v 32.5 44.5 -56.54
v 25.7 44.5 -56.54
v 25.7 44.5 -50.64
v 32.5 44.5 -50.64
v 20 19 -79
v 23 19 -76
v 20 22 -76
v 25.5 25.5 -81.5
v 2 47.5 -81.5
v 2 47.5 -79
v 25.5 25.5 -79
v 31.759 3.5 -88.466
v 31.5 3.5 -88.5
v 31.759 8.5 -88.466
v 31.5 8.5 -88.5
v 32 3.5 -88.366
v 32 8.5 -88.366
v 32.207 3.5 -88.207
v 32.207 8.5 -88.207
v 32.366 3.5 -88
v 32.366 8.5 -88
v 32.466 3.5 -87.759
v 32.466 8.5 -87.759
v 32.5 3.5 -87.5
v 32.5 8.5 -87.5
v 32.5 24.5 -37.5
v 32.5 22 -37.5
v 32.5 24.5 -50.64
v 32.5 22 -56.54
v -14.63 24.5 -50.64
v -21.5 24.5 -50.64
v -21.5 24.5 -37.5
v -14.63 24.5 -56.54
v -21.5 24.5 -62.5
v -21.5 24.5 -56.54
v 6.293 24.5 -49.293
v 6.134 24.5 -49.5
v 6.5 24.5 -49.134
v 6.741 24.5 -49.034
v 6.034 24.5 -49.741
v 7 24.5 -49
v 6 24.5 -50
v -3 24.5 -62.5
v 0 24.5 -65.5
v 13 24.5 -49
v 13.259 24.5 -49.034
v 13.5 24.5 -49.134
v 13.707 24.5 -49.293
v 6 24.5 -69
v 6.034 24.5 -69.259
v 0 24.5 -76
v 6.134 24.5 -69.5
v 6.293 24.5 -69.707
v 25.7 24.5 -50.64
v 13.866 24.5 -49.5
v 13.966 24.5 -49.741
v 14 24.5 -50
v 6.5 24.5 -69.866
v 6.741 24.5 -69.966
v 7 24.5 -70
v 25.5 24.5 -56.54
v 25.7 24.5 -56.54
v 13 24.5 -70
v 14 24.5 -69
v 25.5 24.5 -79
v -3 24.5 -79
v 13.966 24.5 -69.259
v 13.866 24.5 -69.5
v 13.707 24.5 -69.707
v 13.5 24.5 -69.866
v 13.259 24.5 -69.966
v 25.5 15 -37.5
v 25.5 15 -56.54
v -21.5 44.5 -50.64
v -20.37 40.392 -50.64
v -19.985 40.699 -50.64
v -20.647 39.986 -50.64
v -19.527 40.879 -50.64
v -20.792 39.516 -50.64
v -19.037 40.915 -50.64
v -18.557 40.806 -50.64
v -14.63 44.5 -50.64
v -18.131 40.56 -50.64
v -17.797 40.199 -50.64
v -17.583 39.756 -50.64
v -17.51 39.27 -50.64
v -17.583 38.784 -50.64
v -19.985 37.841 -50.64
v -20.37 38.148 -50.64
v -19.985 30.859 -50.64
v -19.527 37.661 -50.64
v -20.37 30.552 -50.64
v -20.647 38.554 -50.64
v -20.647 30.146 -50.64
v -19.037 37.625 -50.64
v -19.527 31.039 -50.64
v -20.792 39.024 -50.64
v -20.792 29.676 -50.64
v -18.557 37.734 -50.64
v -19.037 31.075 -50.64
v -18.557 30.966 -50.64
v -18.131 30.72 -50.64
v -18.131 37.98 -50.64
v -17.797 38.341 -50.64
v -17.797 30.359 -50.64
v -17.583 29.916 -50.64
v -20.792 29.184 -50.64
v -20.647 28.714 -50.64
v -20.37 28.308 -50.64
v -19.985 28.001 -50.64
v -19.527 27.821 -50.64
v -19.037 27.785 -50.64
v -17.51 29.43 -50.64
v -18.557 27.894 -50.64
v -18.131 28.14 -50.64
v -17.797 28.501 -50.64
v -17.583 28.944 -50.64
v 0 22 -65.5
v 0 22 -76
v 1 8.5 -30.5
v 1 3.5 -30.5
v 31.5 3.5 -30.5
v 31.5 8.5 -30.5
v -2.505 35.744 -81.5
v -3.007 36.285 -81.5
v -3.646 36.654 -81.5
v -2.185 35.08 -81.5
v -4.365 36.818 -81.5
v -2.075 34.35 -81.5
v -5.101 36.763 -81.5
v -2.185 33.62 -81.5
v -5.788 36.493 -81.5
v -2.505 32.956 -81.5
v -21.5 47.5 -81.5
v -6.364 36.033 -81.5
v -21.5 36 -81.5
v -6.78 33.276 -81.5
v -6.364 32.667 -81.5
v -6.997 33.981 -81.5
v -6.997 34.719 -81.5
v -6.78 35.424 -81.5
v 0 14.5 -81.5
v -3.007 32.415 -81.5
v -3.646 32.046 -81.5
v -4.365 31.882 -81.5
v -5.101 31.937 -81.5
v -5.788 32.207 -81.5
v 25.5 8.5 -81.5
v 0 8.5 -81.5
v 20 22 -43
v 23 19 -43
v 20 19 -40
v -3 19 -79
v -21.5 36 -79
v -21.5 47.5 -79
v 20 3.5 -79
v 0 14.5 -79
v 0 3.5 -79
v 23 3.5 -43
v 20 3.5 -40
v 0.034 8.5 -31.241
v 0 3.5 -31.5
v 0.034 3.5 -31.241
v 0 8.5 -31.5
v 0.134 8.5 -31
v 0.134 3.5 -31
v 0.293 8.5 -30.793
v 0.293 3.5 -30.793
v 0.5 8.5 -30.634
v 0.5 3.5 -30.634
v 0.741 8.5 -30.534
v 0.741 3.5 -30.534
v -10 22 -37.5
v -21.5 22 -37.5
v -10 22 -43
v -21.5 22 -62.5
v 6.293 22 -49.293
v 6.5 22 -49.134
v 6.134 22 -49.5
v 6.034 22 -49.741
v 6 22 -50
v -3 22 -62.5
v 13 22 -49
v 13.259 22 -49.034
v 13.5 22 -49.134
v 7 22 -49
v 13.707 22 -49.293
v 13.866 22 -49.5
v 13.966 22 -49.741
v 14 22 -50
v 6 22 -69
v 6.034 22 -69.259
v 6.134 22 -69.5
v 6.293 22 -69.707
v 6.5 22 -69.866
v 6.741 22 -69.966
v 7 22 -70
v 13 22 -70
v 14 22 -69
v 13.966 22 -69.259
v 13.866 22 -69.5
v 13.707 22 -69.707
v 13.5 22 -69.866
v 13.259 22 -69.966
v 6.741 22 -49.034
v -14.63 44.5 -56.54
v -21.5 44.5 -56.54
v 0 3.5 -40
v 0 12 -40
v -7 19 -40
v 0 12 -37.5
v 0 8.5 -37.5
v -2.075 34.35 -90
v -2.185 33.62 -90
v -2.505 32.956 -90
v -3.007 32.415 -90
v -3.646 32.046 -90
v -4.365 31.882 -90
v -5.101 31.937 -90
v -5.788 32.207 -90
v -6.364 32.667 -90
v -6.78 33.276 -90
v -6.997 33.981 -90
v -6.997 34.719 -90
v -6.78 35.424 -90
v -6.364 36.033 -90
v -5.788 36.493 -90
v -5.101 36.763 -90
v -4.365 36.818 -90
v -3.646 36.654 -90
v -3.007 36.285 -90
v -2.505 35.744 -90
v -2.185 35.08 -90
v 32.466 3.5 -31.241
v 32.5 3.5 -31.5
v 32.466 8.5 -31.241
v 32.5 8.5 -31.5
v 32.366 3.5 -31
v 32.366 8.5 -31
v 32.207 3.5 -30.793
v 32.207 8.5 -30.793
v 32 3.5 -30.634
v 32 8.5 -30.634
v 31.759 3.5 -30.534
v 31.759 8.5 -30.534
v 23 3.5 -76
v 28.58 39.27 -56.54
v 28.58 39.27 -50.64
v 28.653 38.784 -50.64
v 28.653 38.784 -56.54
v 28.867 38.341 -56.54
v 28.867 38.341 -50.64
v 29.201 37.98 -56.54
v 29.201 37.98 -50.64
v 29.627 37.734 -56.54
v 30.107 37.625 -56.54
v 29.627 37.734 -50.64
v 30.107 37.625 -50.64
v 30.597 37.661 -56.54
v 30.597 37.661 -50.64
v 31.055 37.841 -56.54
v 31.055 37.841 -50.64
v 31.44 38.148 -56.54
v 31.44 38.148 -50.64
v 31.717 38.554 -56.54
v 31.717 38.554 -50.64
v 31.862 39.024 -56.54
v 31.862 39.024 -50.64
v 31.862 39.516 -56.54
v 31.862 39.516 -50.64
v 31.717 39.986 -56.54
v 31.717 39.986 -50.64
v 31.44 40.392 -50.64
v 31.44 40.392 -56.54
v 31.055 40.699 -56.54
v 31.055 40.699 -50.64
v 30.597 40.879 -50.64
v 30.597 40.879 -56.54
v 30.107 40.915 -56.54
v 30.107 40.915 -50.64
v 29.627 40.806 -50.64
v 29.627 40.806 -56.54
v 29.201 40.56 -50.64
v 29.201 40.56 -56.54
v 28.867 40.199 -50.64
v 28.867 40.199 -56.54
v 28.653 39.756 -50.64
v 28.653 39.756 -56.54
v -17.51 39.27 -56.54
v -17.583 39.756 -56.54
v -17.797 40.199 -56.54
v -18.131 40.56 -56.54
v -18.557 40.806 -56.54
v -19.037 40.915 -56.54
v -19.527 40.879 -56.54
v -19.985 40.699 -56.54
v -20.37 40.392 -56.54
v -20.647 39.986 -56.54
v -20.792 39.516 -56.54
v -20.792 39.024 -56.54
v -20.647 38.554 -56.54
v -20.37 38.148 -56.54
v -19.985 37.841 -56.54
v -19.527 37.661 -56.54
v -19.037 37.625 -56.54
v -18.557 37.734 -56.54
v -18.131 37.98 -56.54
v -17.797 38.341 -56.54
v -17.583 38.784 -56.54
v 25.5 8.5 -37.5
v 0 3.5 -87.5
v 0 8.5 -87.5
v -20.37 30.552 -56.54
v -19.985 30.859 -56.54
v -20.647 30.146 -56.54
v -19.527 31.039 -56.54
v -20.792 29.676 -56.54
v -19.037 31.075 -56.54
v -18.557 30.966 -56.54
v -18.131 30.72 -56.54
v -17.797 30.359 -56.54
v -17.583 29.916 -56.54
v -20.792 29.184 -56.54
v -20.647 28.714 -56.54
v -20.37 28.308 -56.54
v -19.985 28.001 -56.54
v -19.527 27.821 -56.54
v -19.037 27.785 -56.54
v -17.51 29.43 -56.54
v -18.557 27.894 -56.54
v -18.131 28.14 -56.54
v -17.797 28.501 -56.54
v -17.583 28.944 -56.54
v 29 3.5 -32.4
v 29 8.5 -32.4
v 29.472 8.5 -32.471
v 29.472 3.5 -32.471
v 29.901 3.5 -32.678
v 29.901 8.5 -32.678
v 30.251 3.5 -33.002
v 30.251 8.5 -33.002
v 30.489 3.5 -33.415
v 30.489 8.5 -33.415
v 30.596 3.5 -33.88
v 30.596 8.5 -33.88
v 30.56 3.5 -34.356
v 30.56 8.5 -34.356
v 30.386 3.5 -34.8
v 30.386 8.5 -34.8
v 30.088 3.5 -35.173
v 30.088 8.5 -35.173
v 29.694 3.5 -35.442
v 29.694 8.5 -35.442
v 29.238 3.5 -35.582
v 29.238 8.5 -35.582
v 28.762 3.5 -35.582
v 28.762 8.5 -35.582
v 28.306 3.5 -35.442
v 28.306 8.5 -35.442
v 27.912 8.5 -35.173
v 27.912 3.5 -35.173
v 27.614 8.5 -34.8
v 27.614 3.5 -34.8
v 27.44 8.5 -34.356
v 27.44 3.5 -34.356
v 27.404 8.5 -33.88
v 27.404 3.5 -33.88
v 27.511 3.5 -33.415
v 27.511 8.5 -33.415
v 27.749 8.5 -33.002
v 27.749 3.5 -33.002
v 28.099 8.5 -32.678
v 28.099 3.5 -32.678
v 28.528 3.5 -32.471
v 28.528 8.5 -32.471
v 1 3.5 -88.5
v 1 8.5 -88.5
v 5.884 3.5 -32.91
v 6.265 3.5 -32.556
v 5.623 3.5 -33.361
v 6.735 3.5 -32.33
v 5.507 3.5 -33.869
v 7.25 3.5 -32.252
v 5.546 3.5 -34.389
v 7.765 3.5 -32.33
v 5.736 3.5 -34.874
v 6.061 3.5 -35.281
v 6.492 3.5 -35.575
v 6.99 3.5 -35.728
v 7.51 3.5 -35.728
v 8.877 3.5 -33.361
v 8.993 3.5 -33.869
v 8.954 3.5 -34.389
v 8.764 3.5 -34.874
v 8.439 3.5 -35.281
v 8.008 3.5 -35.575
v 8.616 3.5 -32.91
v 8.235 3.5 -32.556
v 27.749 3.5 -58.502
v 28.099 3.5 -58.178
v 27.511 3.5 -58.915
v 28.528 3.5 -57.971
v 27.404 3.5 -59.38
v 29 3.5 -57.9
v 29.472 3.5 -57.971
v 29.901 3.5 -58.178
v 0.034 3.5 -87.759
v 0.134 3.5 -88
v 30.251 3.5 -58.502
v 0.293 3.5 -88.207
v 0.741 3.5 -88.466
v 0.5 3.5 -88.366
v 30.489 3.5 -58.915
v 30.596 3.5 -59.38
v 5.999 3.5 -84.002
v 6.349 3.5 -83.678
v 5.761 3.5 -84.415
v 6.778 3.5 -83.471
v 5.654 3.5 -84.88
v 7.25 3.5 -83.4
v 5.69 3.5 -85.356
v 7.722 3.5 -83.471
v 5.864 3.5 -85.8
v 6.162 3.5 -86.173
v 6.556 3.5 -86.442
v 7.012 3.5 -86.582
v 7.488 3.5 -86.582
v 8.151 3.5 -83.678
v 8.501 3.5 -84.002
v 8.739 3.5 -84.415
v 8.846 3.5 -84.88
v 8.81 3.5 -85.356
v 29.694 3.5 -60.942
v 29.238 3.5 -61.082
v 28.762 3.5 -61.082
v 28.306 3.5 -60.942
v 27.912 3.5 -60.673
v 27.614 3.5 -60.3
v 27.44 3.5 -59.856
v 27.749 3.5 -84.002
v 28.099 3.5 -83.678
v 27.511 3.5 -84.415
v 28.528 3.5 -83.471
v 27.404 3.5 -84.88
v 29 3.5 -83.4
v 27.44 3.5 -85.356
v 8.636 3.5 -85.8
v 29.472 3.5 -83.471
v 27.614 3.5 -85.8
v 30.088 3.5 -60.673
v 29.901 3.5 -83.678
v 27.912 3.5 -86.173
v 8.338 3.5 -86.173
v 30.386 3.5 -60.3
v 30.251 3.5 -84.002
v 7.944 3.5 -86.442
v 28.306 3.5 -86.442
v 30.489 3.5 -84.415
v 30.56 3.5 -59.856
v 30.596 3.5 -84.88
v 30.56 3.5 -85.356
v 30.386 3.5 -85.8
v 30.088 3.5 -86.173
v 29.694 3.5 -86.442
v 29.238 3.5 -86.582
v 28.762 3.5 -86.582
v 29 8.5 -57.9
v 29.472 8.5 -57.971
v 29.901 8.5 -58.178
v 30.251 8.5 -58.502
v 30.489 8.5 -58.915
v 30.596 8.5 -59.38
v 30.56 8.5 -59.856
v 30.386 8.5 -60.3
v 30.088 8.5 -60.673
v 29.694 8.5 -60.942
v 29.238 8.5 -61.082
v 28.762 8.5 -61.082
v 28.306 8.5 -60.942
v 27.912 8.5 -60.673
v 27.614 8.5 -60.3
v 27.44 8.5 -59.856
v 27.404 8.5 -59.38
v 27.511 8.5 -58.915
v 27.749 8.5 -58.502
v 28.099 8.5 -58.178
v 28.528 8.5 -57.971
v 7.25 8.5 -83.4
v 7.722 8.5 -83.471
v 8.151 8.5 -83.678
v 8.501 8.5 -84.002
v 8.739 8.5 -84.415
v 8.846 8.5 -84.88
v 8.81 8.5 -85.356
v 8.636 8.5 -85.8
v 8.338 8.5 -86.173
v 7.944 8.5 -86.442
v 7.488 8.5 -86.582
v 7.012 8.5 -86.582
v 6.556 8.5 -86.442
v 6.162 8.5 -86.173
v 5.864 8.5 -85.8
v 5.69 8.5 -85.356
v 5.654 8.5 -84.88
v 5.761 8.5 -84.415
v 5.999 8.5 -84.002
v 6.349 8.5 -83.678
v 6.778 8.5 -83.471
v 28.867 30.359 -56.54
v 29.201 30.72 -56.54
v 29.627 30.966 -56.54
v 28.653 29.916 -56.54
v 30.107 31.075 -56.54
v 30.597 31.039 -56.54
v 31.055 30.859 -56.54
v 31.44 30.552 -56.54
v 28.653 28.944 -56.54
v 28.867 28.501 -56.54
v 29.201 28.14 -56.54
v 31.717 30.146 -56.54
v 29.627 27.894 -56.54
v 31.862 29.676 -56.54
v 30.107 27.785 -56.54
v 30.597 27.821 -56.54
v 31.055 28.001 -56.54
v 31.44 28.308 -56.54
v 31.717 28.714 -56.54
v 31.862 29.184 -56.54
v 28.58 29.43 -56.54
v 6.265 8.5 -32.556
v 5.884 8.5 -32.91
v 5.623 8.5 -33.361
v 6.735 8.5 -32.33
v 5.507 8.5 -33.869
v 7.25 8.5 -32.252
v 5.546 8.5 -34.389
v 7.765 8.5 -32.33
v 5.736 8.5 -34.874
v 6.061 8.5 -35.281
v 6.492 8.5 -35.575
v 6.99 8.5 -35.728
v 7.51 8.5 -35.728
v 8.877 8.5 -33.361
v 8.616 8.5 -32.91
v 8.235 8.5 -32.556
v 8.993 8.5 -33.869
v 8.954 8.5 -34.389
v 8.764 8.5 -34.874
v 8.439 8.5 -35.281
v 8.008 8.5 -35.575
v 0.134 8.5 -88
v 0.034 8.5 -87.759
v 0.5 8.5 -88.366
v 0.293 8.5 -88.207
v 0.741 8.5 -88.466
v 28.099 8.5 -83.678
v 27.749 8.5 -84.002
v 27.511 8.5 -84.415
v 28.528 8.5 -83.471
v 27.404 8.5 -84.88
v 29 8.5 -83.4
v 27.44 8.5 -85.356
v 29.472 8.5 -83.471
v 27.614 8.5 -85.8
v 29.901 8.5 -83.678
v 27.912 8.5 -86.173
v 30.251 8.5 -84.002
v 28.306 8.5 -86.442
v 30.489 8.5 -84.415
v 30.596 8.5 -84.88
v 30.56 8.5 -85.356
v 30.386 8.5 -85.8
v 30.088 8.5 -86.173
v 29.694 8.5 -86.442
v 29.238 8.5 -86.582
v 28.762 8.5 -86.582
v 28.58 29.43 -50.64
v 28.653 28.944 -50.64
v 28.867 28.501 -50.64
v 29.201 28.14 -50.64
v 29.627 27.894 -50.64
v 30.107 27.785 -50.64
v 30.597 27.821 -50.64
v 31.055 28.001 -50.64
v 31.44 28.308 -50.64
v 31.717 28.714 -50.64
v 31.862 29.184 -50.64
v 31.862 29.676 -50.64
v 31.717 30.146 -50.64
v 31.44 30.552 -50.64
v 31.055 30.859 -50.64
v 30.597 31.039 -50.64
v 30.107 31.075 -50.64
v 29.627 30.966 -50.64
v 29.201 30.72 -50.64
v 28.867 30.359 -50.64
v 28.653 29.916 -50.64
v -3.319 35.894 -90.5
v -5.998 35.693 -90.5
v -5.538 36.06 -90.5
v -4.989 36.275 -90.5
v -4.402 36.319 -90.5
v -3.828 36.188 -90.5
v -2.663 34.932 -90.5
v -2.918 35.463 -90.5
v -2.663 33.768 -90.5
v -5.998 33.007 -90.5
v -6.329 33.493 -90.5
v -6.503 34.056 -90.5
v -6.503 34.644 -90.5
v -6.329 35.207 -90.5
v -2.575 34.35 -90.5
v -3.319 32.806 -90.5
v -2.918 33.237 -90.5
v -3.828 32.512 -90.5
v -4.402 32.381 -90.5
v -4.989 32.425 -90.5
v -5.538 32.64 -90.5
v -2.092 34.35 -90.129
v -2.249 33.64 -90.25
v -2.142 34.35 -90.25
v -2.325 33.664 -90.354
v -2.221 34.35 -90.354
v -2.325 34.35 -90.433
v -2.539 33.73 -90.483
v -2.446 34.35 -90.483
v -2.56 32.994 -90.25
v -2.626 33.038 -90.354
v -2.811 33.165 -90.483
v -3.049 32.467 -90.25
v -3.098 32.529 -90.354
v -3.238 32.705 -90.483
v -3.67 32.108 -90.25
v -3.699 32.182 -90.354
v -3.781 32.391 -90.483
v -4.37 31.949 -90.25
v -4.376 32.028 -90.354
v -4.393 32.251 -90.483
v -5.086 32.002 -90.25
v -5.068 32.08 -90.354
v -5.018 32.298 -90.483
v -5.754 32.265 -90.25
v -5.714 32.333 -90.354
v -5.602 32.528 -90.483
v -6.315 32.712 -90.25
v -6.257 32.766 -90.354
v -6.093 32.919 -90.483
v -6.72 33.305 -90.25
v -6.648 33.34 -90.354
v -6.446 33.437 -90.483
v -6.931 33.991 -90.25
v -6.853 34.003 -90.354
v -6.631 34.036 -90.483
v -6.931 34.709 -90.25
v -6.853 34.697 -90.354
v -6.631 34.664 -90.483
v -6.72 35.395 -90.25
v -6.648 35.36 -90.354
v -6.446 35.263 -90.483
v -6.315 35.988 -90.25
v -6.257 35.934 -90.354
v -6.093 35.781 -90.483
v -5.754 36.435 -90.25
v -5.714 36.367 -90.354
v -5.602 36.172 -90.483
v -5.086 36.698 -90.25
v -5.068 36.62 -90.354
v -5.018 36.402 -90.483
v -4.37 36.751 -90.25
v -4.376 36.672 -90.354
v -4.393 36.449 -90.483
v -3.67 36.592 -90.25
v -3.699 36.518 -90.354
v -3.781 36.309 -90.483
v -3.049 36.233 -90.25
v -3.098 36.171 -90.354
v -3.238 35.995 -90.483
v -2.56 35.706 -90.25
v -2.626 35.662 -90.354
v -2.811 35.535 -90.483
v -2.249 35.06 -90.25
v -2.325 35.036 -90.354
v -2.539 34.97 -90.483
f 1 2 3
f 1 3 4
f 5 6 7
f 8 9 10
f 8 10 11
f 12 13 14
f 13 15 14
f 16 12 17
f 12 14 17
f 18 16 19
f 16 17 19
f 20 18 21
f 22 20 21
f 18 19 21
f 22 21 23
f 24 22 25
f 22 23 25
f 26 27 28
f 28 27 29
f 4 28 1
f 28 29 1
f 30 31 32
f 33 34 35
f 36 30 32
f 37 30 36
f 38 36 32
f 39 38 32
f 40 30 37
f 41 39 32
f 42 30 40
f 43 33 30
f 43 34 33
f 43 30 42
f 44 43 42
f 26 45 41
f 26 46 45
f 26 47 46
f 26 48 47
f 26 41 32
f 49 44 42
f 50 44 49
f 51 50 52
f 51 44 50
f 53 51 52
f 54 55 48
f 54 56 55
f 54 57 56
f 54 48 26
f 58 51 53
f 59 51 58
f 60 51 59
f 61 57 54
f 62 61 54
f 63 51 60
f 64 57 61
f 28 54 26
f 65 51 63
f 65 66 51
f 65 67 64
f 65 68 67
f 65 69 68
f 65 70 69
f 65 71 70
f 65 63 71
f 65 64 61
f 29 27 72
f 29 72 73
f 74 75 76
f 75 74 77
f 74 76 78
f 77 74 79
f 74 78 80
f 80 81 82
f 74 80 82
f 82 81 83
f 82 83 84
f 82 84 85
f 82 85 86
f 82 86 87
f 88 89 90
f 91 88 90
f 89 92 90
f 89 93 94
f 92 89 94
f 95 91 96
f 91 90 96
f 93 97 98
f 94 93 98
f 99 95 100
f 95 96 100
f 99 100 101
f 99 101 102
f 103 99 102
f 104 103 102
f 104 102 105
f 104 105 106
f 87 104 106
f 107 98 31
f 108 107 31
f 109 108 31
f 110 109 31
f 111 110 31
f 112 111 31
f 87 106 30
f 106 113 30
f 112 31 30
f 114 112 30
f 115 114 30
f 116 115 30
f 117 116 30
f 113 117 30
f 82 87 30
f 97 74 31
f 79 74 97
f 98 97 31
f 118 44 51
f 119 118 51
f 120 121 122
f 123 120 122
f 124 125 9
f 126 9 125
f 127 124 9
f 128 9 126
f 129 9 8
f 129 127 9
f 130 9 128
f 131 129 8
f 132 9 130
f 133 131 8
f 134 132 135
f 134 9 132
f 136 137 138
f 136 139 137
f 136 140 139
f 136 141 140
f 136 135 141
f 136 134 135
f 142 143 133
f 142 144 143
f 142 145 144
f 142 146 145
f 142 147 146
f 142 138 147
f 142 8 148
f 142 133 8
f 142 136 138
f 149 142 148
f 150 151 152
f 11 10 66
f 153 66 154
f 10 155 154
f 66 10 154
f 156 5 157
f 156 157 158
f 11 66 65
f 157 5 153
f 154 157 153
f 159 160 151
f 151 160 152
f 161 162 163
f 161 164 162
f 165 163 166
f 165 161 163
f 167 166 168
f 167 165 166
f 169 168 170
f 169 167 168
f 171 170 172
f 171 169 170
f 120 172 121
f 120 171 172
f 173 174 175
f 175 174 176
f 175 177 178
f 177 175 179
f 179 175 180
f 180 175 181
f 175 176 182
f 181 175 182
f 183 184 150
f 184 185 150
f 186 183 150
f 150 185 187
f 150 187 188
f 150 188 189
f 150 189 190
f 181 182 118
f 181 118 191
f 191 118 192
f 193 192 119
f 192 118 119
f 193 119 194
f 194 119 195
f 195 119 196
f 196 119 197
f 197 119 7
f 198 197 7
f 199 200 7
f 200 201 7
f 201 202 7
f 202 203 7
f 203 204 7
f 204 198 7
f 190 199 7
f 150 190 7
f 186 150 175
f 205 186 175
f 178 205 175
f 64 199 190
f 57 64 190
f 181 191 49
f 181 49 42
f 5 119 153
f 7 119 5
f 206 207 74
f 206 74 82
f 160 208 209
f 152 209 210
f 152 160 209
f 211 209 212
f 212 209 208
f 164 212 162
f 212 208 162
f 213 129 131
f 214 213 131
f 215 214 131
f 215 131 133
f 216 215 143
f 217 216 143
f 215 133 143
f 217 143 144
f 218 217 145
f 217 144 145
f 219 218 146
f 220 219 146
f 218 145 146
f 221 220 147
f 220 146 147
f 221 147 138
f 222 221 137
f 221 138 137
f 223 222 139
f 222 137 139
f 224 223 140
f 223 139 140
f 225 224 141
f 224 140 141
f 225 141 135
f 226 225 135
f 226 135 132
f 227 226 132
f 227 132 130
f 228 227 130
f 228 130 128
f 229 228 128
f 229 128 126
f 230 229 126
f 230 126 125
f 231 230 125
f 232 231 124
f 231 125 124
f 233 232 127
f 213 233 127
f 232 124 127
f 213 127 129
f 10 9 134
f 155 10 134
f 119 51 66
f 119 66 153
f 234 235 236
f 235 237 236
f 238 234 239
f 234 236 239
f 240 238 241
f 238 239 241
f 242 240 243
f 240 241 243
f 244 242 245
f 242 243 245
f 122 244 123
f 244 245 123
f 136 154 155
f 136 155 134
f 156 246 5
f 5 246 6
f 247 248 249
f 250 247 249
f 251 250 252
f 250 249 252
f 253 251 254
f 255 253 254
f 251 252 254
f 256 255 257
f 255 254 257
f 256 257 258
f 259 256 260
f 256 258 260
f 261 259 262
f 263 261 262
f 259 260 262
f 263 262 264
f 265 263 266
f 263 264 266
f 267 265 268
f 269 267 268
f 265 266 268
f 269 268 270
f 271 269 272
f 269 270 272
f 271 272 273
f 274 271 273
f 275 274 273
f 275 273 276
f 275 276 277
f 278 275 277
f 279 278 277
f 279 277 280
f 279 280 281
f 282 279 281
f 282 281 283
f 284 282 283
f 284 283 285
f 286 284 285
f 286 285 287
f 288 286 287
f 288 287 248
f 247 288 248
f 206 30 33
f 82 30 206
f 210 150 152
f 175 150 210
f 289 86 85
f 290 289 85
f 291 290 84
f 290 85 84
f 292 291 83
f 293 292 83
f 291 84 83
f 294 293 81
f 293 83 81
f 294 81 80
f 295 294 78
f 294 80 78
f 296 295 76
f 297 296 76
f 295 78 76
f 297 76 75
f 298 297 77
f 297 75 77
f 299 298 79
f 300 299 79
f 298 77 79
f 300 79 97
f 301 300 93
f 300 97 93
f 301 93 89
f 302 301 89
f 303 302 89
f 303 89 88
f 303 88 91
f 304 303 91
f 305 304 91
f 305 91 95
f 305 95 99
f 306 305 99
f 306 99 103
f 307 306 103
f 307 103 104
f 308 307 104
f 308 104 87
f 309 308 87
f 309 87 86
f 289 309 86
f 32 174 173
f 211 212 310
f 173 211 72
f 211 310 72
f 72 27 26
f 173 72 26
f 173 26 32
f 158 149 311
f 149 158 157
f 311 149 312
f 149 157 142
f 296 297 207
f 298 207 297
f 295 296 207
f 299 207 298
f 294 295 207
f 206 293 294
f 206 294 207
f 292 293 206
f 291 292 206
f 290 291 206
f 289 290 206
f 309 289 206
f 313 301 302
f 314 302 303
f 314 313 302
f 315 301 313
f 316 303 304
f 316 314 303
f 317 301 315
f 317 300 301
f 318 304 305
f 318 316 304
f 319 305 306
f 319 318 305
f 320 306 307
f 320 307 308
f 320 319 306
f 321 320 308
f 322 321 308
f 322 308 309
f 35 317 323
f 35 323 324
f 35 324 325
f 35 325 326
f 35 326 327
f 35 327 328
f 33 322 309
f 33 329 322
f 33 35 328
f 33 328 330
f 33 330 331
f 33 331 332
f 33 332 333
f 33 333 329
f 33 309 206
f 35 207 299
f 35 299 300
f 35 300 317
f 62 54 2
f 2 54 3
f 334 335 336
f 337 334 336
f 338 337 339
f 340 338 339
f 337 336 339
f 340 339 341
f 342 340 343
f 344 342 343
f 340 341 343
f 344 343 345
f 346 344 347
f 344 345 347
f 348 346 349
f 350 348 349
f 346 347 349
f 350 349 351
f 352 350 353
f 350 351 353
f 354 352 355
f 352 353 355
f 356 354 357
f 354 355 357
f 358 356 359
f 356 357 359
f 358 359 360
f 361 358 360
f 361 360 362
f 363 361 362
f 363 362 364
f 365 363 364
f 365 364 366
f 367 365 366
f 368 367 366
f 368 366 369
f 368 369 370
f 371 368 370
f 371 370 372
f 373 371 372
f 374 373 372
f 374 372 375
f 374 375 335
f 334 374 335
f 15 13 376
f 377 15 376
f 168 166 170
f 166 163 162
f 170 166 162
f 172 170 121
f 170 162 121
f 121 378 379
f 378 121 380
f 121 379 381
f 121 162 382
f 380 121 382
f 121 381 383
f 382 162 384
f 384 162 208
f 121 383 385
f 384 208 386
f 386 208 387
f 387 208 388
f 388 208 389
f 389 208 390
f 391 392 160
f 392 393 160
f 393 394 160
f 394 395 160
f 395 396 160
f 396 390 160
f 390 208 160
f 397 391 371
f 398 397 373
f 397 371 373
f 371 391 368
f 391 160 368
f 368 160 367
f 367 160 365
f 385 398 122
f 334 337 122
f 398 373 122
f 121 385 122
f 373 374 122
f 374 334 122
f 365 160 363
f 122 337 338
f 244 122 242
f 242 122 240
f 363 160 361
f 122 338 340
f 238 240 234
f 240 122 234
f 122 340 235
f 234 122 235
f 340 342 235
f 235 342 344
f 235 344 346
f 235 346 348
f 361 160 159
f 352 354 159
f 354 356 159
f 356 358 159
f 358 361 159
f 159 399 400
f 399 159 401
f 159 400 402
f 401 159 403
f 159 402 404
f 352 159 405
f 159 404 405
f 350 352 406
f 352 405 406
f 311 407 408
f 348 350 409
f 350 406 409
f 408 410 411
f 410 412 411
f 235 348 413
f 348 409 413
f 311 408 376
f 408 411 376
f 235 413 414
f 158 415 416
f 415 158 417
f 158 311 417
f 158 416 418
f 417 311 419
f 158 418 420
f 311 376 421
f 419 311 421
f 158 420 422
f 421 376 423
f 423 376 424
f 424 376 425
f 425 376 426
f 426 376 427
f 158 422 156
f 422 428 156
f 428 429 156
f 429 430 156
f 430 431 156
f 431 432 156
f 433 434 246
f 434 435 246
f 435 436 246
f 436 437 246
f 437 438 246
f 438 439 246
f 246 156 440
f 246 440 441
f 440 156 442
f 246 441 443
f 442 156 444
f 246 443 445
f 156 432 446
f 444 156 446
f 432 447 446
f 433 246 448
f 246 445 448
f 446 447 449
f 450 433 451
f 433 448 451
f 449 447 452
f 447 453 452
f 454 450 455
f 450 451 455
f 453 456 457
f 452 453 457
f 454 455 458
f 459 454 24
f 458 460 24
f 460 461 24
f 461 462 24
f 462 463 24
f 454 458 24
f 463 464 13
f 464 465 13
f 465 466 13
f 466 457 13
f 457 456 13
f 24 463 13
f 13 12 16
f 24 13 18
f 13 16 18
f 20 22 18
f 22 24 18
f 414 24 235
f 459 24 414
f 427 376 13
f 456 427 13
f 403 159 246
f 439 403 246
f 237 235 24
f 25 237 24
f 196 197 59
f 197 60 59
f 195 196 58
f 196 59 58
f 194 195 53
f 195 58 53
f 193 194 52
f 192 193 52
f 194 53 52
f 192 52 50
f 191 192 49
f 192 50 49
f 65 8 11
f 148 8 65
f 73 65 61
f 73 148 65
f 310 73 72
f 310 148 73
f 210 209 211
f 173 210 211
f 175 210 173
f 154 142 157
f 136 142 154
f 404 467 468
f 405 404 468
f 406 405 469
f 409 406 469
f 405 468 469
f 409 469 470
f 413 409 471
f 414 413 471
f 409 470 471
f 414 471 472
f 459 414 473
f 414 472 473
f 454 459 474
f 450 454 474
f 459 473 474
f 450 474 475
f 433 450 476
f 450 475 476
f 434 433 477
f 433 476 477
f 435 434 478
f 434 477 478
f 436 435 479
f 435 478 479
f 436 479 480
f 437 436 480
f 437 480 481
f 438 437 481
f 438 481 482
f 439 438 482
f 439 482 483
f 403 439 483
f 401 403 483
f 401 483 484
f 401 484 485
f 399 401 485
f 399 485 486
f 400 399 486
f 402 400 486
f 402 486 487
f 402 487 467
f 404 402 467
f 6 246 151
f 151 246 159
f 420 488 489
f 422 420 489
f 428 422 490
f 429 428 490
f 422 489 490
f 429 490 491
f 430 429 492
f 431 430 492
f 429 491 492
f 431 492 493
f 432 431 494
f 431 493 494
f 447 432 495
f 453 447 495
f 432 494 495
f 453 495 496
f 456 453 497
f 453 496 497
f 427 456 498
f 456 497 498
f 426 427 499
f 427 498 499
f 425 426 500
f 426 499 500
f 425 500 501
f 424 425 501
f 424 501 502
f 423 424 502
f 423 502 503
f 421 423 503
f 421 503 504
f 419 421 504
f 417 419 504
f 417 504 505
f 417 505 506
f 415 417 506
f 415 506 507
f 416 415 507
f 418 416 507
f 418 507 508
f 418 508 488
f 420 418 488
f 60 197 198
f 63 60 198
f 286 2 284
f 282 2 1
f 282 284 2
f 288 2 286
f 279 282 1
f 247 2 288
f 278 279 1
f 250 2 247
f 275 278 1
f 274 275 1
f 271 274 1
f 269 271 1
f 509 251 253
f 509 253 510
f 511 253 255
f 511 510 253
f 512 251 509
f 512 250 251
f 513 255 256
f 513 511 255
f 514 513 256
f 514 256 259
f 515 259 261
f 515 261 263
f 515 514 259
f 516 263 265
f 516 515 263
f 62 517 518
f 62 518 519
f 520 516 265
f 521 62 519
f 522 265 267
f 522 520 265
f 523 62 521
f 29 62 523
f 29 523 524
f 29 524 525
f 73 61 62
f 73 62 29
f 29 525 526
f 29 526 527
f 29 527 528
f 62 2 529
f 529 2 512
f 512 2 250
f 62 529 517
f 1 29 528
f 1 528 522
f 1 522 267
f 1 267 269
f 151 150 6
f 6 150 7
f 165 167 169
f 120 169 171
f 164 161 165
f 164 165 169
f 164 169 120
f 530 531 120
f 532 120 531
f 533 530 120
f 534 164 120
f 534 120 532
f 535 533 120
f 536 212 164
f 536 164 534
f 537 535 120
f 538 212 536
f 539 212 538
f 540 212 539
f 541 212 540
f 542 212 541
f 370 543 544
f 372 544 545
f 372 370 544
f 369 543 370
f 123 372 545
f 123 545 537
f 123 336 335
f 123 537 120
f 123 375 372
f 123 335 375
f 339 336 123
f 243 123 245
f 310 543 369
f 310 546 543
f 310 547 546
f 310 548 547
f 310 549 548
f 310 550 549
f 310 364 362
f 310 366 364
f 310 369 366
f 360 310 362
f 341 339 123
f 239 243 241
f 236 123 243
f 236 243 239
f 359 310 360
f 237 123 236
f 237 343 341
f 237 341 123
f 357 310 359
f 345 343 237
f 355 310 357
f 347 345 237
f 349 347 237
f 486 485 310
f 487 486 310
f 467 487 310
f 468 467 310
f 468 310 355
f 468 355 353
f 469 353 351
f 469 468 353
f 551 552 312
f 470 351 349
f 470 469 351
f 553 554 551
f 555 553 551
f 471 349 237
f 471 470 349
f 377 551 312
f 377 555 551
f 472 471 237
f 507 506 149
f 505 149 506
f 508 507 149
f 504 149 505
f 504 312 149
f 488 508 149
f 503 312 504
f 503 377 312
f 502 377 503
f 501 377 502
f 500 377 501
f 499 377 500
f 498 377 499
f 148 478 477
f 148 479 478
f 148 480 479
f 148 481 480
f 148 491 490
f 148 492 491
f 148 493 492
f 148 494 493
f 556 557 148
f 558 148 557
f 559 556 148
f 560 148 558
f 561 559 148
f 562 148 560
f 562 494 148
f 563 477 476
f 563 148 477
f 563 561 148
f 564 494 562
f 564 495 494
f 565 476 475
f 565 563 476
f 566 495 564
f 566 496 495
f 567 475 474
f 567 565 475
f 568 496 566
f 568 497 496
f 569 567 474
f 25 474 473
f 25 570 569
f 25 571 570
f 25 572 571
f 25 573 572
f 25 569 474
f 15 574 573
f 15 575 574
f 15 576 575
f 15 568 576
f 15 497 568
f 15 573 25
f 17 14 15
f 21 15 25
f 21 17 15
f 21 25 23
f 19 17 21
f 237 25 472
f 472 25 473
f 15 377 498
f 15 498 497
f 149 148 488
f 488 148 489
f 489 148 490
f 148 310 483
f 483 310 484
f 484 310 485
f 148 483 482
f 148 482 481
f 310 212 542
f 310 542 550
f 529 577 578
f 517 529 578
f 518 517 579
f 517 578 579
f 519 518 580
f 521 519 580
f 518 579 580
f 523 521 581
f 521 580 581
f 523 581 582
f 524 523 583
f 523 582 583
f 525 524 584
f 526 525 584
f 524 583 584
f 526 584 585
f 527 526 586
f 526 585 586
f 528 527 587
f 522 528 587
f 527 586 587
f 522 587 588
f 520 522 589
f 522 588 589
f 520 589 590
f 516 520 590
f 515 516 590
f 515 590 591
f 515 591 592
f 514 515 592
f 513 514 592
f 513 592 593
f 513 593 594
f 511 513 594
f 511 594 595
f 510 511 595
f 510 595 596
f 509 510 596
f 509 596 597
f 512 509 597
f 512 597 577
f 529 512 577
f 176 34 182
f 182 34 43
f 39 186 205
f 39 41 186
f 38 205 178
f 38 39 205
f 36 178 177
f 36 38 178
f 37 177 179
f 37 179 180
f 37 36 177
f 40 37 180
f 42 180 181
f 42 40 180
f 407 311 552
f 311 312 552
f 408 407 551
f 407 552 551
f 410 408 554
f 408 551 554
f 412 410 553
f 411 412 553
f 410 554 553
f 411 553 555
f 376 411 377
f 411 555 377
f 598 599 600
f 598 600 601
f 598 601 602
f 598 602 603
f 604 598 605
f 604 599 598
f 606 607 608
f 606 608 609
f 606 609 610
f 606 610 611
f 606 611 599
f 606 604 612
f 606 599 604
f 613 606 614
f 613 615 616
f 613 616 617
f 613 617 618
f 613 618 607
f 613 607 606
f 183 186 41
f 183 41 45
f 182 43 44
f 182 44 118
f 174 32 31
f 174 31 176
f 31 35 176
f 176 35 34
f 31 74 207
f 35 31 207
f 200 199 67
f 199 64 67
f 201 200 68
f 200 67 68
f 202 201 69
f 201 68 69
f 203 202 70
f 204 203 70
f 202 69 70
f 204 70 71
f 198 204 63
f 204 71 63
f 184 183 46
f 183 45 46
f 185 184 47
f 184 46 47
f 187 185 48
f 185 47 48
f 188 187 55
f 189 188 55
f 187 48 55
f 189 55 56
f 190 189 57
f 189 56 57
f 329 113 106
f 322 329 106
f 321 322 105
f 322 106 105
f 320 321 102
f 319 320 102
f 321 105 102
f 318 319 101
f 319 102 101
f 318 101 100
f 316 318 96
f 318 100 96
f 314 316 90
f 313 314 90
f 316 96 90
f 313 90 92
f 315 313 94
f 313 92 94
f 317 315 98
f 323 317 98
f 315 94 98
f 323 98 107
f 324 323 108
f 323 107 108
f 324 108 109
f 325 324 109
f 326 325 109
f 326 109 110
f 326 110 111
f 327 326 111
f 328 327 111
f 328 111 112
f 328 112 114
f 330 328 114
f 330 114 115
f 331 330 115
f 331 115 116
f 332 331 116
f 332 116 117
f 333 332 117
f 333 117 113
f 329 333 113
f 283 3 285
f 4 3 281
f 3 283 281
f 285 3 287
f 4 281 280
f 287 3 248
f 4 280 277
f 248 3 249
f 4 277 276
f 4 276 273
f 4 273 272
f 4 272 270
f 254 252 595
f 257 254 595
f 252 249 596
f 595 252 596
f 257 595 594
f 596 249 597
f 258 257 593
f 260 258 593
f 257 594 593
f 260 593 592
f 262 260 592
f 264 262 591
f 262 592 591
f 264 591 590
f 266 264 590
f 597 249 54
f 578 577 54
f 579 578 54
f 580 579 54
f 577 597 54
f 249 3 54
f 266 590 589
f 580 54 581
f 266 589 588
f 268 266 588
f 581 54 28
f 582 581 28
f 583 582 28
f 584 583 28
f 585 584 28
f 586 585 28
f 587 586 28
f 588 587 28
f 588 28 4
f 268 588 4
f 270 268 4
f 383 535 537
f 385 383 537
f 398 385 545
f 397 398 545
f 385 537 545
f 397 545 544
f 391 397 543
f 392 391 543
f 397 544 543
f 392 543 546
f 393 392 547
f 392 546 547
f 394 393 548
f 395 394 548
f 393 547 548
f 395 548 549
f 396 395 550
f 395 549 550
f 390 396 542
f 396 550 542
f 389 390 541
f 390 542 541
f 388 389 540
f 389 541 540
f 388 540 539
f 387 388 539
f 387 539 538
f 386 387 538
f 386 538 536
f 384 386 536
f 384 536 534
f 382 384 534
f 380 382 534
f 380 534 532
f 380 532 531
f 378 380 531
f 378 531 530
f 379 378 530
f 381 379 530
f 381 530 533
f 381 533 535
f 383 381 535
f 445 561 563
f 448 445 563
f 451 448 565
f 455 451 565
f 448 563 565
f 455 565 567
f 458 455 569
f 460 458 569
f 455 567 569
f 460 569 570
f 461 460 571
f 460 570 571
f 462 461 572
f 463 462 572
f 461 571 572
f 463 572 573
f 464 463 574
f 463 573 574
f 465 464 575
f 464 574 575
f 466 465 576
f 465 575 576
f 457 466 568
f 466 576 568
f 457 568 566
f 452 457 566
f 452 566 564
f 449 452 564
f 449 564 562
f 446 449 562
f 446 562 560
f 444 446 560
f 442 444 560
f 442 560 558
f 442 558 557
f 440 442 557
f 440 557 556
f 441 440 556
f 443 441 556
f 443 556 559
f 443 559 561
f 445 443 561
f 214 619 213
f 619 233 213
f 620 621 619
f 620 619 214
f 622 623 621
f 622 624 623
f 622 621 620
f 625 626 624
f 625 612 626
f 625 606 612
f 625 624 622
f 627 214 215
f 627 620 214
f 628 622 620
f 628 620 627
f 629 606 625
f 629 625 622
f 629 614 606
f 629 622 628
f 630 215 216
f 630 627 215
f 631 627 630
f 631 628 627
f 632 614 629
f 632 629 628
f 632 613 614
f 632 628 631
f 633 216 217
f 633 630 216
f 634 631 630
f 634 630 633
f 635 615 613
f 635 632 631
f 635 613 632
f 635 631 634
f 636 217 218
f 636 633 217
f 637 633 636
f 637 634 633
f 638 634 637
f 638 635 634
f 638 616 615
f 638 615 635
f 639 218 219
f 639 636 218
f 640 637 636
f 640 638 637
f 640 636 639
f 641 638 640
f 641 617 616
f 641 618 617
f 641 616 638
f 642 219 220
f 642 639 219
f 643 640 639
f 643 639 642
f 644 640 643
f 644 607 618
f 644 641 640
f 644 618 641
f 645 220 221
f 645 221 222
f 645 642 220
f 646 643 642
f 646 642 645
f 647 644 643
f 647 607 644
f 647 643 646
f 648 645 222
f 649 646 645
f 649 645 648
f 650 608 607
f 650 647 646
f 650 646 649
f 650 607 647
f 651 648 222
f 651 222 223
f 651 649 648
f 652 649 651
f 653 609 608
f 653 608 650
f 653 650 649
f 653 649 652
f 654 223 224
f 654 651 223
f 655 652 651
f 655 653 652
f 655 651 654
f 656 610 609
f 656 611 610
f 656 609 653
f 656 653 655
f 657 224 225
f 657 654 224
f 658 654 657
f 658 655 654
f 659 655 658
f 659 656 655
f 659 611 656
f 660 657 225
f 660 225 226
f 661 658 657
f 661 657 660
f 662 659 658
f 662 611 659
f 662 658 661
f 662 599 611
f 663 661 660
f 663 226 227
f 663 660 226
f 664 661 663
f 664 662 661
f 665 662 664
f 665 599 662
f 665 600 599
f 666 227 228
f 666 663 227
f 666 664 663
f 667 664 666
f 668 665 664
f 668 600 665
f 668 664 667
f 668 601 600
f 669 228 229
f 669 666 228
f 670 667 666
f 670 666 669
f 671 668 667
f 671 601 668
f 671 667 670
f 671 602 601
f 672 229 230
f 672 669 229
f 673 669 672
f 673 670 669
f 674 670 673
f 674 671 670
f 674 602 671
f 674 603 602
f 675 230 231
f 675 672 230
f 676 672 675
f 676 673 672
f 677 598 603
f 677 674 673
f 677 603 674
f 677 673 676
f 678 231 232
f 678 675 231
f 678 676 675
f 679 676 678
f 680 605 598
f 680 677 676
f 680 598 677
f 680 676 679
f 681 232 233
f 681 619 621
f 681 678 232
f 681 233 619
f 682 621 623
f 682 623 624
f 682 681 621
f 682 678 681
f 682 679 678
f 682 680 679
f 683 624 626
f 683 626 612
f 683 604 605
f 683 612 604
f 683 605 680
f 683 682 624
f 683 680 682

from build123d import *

# Parameters (mm, degrees)
BOSS_EXTRUDE1_DEPTH = 3.5
BOSS_EXTRUDE2_DEPTH = 21
SKETCH3_W           = 23
SKETCH3_H           = 39
BOSS_EXTRUDE3_DEPTH = 2.5
SKETCH5_W           = 21.5
SKETCH5_H           = 25
SKETCH5_W_2         = 7.07
SKETCH5_H_2         = 19.04
BOSS_EXTRUDE5_DEPTH = 2.5
SKETCH6_W           = 7.07
SKETCH6_H           = 5.9
BOSS_EXTRUDE6_DEPTH = 20
BOSS_EXTRUDE7_DEPTH = 23
FILLET1_SIZE        = 10
SKETCH9_R           = 2.475
BOSS_EXTRUDE8_DEPTH = 9
FILLET2_R           = 0.5
SKETCH10_R          = 1.65
CUT_EXTRUDE1_DEPTH  = 9
SKETCH11_W          = 0.2
SKETCH11_H          = 20
CUT_EXTRUDE2_DEPTH  = 9
CUT_EXTRUDE3_DEPTH  = 9
FILLET3_SIZE        = 3
BOSS_EXTRUDE9_DEPTH = 5
SKETCH14_R          = 1.747814763
SKETCH14_R_2        = 1.6
CUT_EXTRUDE4_DEPTH  = 15
CUT_EXTRUDE5_DEPTH  = 113
FILLET4_SIZE        = 7
FILLET5_SIZE        = 3
FILLET6_SIZE        = 3
FILLET7_R           = 1
SKETCH16_W          = 8
SKETCH16_H          = 21
CUT_EXTRUDE6_DEPTH  = 113
FILLET8_R           = 1


# Some blends are built 0.0001 mm under size
with BuildPart() as part:
    # Sketch1 → Boss-Extrude1 (new body)
    with BuildSketch(Plane(origin=(0, 0, 0), x_dir=(1, 0, 0), z_dir=(0, 1, 0))):
        Polygon((0, 40), (23, 40), (23, 79), (0, 79), (0, 100), (110, 100), (110, 79), (87, 79), (87, 40), (110, 40), (110, 20), (80, 0), (30, 0), (0, 20), align=None)
    extrude(amount=BOSS_EXTRUDE1_DEPTH)

    # Sketch2 → Boss-Extrude2 (add)
    with BuildSketch(Plane(origin=(0, 3.5, 0), x_dir=(1, 0, 0), z_dir=(0, 1, 0))):
        Polygon((0, 79), (23, 79), (23, 40), (0, 40), (0, 37.5), (25.5, 37.5), (25.5, 81.5), (0, 81.5), align=None)
        Polygon((110, 81.5), (84.5, 81.5), (84.5, 37.5), (110, 37.5), (110, 40), (87, 40), (87, 79), (110, 79), align=None)
    extrude(amount=BOSS_EXTRUDE2_DEPTH)

    # Sketch3 → Boss-Extrude3 (add)
    with BuildSketch(Plane(origin=(0, 24.5, 0), x_dir=(1, 0, 0), z_dir=(0, 1, 0))):
        with Locations((11.5, 59.5)):
            Rectangle(SKETCH3_W, SKETCH3_H)
        with Locations((98.5, 59.5)):
            Rectangle(SKETCH3_W, SKETCH3_H)
    extrude(amount=-BOSS_EXTRUDE3_DEPTH)

    # Sketch5 → Boss-Extrude5 (add)
    with BuildSketch(Plane(origin=(0, 24.5, 0), x_dir=(1, 0, 0), z_dir=(0, 1, 0))):
        with Locations((120.75, 50)):
            Rectangle(SKETCH5_W, SKETCH5_H)
        with Locations((-10.75, 50)):
            Rectangle(SKETCH5_W, SKETCH5_H)
        with Locations((29.035, 47.02)):
            Rectangle(SKETCH5_W_2, SKETCH5_H_2)
        with Locations((80.965, 47.02)):
            Rectangle(SKETCH5_W_2, SKETCH5_H_2)
    extrude(amount=-BOSS_EXTRUDE5_DEPTH)

    # Sketch6 → Boss-Extrude6 (add)
    with BuildSketch(Plane(origin=(0, 24.5, 0), x_dir=(1, 0, 0), z_dir=(0, 1, 0))):
        with Locations((29.035, 53.59)):
            Rectangle(SKETCH6_W, SKETCH6_H)
        with Locations((80.965, 53.59)):
            Rectangle(SKETCH6_W, SKETCH6_H)
        with Locations((-17.965, 53.59)):
            Rectangle(SKETCH6_W, SKETCH6_H)
        with Locations((127.965, 53.59)):
            Rectangle(SKETCH6_W, SKETCH6_H)
    extrude(amount=BOSS_EXTRUDE6_DEPTH)

    # Sketch7 → Boss-Extrude7 (add)
    with BuildSketch(Plane(origin=(0, 24.5, 0), x_dir=(1, 0, 0), z_dir=(0, 1, 0))):
        Polygon((0, 81.5), (25.5, 81.5), (25.5, 79), (0, 79), (-21.5, 79), (-21.5, 81.5), align=None)
        Polygon((110, 79), (84.5, 79), (84.5, 81.5), (110, 81.5), (131.5, 81.5), (131.5, 79), align=None)
    extrude(amount=BOSS_EXTRUDE7_DEPTH)

    # Fillet1
    # the kernel refuses this chamfer: 10 mm, written as the material it adds along each edge
    with BuildSketch(Plane(origin=(0, 22, -40), x_dir=(0.027495876610586372, -0.9996219169112968, 0), z_dir=(0, 0, 1)), Plane(origin=(110, 22, -37.5), x_dir=(-0.027495876610586317, -0.9996219169112968, 0), z_dir=(0, 0, -1)), Plane(origin=(110, 24.5, -81.5), x_dir=(0.9996219169112968, 0.027495876610586317, 0), z_dir=(0, 0, 1))) as fillet1_piece_1:
        Polygon((FILLET1_SIZE * 0.999621916911, -FILLET1_SIZE * 0.0274958766106), (-FILLET1_SIZE * 0.0274958766106, -FILLET1_SIZE * 0.999621916911), (0, 0), align=None)
    extrude(amount=2.5)
    with BuildSketch(Plane(origin=(0, 24.5, -79), x_dir=(0.027495876610586372, -0.9996219169112968, 0), z_dir=(0, 0, -1))) as fillet1_piece_2:
        Polygon((FILLET1_SIZE * 0.999621916911, FILLET1_SIZE * 0.0274958766106), (-FILLET1_SIZE * 0.0274958766106, FILLET1_SIZE * 0.999621916911), (0, 0), align=None)
    extrude(amount=2.5)

    # Sketch9 → Boss-Extrude8 (add)
    with BuildSketch(Plane(origin=(0, 0, -81.5), x_dir=(-1, 0, 0), z_dir=(0, 0, -1))):
        with Locations(Location((-114.55, 34.35, 0), (0, 0, 180))):
            Circle(SKETCH9_R)
        with Locations(Location((4.55, 34.35, 0), (0, 0, 180))):
            Circle(SKETCH9_R)
    extrude(amount=BOSS_EXTRUDE8_DEPTH)

    # Fillet2
    fillet2_edges = [part.edges().sort_by_distance(p)[0] for p in [
        (112.075, 34.35, -90.5),
        (-7.025, 34.35, -90.5),
    ]]
    fillet(fillet2_edges, radius=FILLET2_R)

    # Sketch10 → Cut-Extrude1 (cut)
    with BuildSketch(Plane.XY.offset(-50.64)):
        with Locations((129.16, 39.27)):
            Circle(SKETCH10_R)
        with Locations((129.16, 29.43)):
            Circle(SKETCH10_R)
        with Locations((79.77, 39.27)):
            Circle(SKETCH10_R)
        with Locations((79.77, 29.43)):
            Circle(SKETCH10_R)
        with Locations((-19.16, 29.43)):
            Circle(SKETCH10_R)
        with Locations((-19.16, 39.27)):
            Circle(SKETCH10_R)
        with Locations(Location((30.23, 39.27, 0), (0, 0, 180))):
            Circle(SKETCH10_R)
        with Locations(Location((30.23, 29.43, 0), (0, 0, 180))):
            Circle(SKETCH10_R)
    extrude(amount=-CUT_EXTRUDE1_DEPTH, mode=Mode.SUBTRACT)

    # Sketch11 → Cut-Extrude2 (cut)
    with BuildSketch(Plane.XY.offset(-50.64)):
        with Locations((-14.53, 34.5)):
            Rectangle(SKETCH11_W, SKETCH11_H)
        with Locations((25.6, 34.5)):
            Rectangle(SKETCH11_W, SKETCH11_H)
        with Locations((84.4, 34.5)):
            Rectangle(SKETCH11_W, SKETCH11_H)
        with Locations((124.53, 34.5)):
            Rectangle(SKETCH11_W, SKETCH11_H)
    extrude(amount=-CUT_EXTRUDE2_DEPTH, mode=Mode.SUBTRACT)

    # Sketch12 → Cut-Extrude3 (cut)
    with BuildSketch(Plane(origin=(0, 0, -81.5), x_dir=(-1, 0, 0), z_dir=(0, 0, -1))):
        Polygon((-108, 47.5), (-84.5, 25.5), (-84.5, 47.5), align=None)
        Polygon((-25.5, 25.5), (-25.5, 47.5), (-2, 47.5), align=None)
        Polygon((-120, 24.5), (-131.5, 36), (-131.5, 24.5), align=None)
        Polygon((10, 24.5), (21.5, 36), (21.5, 24.5), align=None)
    extrude(amount=-CUT_EXTRUDE3_DEPTH, mode=Mode.SUBTRACT)

    # Fillet3
    fillet3_edges = [part.edges().sort_by_distance(p)[0] for p in [
        (0, 23.25, -62.5),
        (110, 23.25, -62.5),
    ]]
    chamfer(fillet3_edges, length=FILLET3_SIZE)

    # Sketch13 → Boss-Extrude9 (add)
    with BuildSketch(Plane(origin=(0, 3.5, 0), x_dir=(1, 0, 0), z_dir=(0, 1, 0))):
        Polygon((0, 30.5), (32.5, 30.5), (32.5, 88.5), (0, 88.5), (0, 81.5), (25.5, 81.5), (25.5, 37.5), (0, 37.5), align=None)
        Polygon((84.5, 37.5), (110, 37.5), (110, 30.5), (77.5, 30.5), (77.5, 88.5), (110, 88.5), (110, 81.5), (84.5, 81.5), align=None)
    extrude(amount=BOSS_EXTRUDE9_DEPTH)

    # Sketch14 → Cut-Extrude4 (cut)
    with BuildSketch(Plane(origin=(0, 8.5, 0), x_dir=(1, 0, 0), z_dir=(0, 1, 0))):
        with Locations(Location((7.25, 34, 0), (0, 0, 270))):
            Circle(SKETCH14_R)
        with Locations(Location((7.25, 85, 0), (0, 0, 270))):
            Circle(SKETCH14_R_2)
        with Locations(Location((29, 34, 0), (0, 0, 270))):
            Circle(SKETCH14_R_2)
        with Locations(Location((29, 59.5, 0), (0, 0, 270))):
            Circle(SKETCH14_R_2)
        with Locations(Location((29, 85, 0), (0, 0, 270))):
            Circle(SKETCH14_R_2)
        with Locations(Location((81, 34, 0), (0, 0, 90))):
            Circle(SKETCH14_R_2)
        with Locations(Location((102.75, 34, 0), (0, 0, 90))):
            Circle(SKETCH14_R)
        with Locations(Location((81, 59.5, 0), (0, 0, 90))):
            Circle(SKETCH14_R_2)
        with Locations(Location((81, 85, 0), (0, 0, 90))):
            Circle(SKETCH14_R_2)
        with Locations(Location((102.75, 85, 0), (0, 0, 90))):
            Circle(SKETCH14_R_2)
    extrude(amount=-CUT_EXTRUDE4_DEPTH, mode=Mode.SUBTRACT)

    # Sketch15 → Cut-Extrude5 (cut)
    with BuildSketch(Plane(origin=(0, 0, -100), x_dir=(-1, 0, 0), z_dir=(0, 0, -1))):
        Polygon((-110, 3.5), (-32.5, 3.5), (-32.5, 47.5), (-131.5, 47.5), (-131.5, 3.5), align=None)
        Polygon((0, 0), (0, 3.5), (-32.5, 3.5), (-110, 3.5), (-110, 0), align=None)
    extrude(amount=-CUT_EXTRUDE5_DEPTH, mode=Mode.SUBTRACT)

    # Fillet4
    fillet4_edges = [part.edges().sort_by_distance(p)[0] for p in [
        (25.5, 22, -47.02),
    ]]
    chamfer(fillet4_edges, length=FILLET4_SIZE - 0.0001)  # a hair under: the kernel refuses the full size

    # Fillet5
    fillet5_edges = [part.edges().sort_by_distance(p)[0] for p in [
        (23, 12.75, -40),
        (23, 12.75, -79),
        (23, 22, -59.5),
        (6.5, 22, -40),
        (11.5, 22, -79),
    ]]
    chamfer(fillet5_edges, length=FILLET5_SIZE)

    # Fillet6
    fillet6_edges = [part.edges().sort_by_distance(p)[0] for p in [
        (0, 21.75, -79),
    ]]
    chamfer(fillet6_edges, length=FILLET6_SIZE)

    # Fillet7
    fillet7_edges = [part.edges().sort_by_distance(p)[0] for p in [
        (0, 6, -30.5),
        (32.5, 6, -30.5),
        (32.5, 6, -88.5),
        (0, 6, -88.5),
    ]]
    fillet(fillet7_edges, radius=FILLET7_R)

    # Sketch16 → Cut-Extrude6 (cut)
    with BuildSketch(Plane.XZ.offset(-22)):
        with Locations((10, -59.5)):
            Rectangle(SKETCH16_W, SKETCH16_H)
    extrude(amount=-CUT_EXTRUDE6_DEPTH, mode=Mode.SUBTRACT)

    # Fillet8
    fillet8_edges = [part.edges().sort_by_distance(p)[0] for p in [
        (6, 23.25, -70),
        (6, 23.25, -49),
        (14, 23.25, -49),
        (14, 23.25, -70),
    ]]
    fillet(fillet8_edges, radius=FILLET8_R)


solid = part.part
